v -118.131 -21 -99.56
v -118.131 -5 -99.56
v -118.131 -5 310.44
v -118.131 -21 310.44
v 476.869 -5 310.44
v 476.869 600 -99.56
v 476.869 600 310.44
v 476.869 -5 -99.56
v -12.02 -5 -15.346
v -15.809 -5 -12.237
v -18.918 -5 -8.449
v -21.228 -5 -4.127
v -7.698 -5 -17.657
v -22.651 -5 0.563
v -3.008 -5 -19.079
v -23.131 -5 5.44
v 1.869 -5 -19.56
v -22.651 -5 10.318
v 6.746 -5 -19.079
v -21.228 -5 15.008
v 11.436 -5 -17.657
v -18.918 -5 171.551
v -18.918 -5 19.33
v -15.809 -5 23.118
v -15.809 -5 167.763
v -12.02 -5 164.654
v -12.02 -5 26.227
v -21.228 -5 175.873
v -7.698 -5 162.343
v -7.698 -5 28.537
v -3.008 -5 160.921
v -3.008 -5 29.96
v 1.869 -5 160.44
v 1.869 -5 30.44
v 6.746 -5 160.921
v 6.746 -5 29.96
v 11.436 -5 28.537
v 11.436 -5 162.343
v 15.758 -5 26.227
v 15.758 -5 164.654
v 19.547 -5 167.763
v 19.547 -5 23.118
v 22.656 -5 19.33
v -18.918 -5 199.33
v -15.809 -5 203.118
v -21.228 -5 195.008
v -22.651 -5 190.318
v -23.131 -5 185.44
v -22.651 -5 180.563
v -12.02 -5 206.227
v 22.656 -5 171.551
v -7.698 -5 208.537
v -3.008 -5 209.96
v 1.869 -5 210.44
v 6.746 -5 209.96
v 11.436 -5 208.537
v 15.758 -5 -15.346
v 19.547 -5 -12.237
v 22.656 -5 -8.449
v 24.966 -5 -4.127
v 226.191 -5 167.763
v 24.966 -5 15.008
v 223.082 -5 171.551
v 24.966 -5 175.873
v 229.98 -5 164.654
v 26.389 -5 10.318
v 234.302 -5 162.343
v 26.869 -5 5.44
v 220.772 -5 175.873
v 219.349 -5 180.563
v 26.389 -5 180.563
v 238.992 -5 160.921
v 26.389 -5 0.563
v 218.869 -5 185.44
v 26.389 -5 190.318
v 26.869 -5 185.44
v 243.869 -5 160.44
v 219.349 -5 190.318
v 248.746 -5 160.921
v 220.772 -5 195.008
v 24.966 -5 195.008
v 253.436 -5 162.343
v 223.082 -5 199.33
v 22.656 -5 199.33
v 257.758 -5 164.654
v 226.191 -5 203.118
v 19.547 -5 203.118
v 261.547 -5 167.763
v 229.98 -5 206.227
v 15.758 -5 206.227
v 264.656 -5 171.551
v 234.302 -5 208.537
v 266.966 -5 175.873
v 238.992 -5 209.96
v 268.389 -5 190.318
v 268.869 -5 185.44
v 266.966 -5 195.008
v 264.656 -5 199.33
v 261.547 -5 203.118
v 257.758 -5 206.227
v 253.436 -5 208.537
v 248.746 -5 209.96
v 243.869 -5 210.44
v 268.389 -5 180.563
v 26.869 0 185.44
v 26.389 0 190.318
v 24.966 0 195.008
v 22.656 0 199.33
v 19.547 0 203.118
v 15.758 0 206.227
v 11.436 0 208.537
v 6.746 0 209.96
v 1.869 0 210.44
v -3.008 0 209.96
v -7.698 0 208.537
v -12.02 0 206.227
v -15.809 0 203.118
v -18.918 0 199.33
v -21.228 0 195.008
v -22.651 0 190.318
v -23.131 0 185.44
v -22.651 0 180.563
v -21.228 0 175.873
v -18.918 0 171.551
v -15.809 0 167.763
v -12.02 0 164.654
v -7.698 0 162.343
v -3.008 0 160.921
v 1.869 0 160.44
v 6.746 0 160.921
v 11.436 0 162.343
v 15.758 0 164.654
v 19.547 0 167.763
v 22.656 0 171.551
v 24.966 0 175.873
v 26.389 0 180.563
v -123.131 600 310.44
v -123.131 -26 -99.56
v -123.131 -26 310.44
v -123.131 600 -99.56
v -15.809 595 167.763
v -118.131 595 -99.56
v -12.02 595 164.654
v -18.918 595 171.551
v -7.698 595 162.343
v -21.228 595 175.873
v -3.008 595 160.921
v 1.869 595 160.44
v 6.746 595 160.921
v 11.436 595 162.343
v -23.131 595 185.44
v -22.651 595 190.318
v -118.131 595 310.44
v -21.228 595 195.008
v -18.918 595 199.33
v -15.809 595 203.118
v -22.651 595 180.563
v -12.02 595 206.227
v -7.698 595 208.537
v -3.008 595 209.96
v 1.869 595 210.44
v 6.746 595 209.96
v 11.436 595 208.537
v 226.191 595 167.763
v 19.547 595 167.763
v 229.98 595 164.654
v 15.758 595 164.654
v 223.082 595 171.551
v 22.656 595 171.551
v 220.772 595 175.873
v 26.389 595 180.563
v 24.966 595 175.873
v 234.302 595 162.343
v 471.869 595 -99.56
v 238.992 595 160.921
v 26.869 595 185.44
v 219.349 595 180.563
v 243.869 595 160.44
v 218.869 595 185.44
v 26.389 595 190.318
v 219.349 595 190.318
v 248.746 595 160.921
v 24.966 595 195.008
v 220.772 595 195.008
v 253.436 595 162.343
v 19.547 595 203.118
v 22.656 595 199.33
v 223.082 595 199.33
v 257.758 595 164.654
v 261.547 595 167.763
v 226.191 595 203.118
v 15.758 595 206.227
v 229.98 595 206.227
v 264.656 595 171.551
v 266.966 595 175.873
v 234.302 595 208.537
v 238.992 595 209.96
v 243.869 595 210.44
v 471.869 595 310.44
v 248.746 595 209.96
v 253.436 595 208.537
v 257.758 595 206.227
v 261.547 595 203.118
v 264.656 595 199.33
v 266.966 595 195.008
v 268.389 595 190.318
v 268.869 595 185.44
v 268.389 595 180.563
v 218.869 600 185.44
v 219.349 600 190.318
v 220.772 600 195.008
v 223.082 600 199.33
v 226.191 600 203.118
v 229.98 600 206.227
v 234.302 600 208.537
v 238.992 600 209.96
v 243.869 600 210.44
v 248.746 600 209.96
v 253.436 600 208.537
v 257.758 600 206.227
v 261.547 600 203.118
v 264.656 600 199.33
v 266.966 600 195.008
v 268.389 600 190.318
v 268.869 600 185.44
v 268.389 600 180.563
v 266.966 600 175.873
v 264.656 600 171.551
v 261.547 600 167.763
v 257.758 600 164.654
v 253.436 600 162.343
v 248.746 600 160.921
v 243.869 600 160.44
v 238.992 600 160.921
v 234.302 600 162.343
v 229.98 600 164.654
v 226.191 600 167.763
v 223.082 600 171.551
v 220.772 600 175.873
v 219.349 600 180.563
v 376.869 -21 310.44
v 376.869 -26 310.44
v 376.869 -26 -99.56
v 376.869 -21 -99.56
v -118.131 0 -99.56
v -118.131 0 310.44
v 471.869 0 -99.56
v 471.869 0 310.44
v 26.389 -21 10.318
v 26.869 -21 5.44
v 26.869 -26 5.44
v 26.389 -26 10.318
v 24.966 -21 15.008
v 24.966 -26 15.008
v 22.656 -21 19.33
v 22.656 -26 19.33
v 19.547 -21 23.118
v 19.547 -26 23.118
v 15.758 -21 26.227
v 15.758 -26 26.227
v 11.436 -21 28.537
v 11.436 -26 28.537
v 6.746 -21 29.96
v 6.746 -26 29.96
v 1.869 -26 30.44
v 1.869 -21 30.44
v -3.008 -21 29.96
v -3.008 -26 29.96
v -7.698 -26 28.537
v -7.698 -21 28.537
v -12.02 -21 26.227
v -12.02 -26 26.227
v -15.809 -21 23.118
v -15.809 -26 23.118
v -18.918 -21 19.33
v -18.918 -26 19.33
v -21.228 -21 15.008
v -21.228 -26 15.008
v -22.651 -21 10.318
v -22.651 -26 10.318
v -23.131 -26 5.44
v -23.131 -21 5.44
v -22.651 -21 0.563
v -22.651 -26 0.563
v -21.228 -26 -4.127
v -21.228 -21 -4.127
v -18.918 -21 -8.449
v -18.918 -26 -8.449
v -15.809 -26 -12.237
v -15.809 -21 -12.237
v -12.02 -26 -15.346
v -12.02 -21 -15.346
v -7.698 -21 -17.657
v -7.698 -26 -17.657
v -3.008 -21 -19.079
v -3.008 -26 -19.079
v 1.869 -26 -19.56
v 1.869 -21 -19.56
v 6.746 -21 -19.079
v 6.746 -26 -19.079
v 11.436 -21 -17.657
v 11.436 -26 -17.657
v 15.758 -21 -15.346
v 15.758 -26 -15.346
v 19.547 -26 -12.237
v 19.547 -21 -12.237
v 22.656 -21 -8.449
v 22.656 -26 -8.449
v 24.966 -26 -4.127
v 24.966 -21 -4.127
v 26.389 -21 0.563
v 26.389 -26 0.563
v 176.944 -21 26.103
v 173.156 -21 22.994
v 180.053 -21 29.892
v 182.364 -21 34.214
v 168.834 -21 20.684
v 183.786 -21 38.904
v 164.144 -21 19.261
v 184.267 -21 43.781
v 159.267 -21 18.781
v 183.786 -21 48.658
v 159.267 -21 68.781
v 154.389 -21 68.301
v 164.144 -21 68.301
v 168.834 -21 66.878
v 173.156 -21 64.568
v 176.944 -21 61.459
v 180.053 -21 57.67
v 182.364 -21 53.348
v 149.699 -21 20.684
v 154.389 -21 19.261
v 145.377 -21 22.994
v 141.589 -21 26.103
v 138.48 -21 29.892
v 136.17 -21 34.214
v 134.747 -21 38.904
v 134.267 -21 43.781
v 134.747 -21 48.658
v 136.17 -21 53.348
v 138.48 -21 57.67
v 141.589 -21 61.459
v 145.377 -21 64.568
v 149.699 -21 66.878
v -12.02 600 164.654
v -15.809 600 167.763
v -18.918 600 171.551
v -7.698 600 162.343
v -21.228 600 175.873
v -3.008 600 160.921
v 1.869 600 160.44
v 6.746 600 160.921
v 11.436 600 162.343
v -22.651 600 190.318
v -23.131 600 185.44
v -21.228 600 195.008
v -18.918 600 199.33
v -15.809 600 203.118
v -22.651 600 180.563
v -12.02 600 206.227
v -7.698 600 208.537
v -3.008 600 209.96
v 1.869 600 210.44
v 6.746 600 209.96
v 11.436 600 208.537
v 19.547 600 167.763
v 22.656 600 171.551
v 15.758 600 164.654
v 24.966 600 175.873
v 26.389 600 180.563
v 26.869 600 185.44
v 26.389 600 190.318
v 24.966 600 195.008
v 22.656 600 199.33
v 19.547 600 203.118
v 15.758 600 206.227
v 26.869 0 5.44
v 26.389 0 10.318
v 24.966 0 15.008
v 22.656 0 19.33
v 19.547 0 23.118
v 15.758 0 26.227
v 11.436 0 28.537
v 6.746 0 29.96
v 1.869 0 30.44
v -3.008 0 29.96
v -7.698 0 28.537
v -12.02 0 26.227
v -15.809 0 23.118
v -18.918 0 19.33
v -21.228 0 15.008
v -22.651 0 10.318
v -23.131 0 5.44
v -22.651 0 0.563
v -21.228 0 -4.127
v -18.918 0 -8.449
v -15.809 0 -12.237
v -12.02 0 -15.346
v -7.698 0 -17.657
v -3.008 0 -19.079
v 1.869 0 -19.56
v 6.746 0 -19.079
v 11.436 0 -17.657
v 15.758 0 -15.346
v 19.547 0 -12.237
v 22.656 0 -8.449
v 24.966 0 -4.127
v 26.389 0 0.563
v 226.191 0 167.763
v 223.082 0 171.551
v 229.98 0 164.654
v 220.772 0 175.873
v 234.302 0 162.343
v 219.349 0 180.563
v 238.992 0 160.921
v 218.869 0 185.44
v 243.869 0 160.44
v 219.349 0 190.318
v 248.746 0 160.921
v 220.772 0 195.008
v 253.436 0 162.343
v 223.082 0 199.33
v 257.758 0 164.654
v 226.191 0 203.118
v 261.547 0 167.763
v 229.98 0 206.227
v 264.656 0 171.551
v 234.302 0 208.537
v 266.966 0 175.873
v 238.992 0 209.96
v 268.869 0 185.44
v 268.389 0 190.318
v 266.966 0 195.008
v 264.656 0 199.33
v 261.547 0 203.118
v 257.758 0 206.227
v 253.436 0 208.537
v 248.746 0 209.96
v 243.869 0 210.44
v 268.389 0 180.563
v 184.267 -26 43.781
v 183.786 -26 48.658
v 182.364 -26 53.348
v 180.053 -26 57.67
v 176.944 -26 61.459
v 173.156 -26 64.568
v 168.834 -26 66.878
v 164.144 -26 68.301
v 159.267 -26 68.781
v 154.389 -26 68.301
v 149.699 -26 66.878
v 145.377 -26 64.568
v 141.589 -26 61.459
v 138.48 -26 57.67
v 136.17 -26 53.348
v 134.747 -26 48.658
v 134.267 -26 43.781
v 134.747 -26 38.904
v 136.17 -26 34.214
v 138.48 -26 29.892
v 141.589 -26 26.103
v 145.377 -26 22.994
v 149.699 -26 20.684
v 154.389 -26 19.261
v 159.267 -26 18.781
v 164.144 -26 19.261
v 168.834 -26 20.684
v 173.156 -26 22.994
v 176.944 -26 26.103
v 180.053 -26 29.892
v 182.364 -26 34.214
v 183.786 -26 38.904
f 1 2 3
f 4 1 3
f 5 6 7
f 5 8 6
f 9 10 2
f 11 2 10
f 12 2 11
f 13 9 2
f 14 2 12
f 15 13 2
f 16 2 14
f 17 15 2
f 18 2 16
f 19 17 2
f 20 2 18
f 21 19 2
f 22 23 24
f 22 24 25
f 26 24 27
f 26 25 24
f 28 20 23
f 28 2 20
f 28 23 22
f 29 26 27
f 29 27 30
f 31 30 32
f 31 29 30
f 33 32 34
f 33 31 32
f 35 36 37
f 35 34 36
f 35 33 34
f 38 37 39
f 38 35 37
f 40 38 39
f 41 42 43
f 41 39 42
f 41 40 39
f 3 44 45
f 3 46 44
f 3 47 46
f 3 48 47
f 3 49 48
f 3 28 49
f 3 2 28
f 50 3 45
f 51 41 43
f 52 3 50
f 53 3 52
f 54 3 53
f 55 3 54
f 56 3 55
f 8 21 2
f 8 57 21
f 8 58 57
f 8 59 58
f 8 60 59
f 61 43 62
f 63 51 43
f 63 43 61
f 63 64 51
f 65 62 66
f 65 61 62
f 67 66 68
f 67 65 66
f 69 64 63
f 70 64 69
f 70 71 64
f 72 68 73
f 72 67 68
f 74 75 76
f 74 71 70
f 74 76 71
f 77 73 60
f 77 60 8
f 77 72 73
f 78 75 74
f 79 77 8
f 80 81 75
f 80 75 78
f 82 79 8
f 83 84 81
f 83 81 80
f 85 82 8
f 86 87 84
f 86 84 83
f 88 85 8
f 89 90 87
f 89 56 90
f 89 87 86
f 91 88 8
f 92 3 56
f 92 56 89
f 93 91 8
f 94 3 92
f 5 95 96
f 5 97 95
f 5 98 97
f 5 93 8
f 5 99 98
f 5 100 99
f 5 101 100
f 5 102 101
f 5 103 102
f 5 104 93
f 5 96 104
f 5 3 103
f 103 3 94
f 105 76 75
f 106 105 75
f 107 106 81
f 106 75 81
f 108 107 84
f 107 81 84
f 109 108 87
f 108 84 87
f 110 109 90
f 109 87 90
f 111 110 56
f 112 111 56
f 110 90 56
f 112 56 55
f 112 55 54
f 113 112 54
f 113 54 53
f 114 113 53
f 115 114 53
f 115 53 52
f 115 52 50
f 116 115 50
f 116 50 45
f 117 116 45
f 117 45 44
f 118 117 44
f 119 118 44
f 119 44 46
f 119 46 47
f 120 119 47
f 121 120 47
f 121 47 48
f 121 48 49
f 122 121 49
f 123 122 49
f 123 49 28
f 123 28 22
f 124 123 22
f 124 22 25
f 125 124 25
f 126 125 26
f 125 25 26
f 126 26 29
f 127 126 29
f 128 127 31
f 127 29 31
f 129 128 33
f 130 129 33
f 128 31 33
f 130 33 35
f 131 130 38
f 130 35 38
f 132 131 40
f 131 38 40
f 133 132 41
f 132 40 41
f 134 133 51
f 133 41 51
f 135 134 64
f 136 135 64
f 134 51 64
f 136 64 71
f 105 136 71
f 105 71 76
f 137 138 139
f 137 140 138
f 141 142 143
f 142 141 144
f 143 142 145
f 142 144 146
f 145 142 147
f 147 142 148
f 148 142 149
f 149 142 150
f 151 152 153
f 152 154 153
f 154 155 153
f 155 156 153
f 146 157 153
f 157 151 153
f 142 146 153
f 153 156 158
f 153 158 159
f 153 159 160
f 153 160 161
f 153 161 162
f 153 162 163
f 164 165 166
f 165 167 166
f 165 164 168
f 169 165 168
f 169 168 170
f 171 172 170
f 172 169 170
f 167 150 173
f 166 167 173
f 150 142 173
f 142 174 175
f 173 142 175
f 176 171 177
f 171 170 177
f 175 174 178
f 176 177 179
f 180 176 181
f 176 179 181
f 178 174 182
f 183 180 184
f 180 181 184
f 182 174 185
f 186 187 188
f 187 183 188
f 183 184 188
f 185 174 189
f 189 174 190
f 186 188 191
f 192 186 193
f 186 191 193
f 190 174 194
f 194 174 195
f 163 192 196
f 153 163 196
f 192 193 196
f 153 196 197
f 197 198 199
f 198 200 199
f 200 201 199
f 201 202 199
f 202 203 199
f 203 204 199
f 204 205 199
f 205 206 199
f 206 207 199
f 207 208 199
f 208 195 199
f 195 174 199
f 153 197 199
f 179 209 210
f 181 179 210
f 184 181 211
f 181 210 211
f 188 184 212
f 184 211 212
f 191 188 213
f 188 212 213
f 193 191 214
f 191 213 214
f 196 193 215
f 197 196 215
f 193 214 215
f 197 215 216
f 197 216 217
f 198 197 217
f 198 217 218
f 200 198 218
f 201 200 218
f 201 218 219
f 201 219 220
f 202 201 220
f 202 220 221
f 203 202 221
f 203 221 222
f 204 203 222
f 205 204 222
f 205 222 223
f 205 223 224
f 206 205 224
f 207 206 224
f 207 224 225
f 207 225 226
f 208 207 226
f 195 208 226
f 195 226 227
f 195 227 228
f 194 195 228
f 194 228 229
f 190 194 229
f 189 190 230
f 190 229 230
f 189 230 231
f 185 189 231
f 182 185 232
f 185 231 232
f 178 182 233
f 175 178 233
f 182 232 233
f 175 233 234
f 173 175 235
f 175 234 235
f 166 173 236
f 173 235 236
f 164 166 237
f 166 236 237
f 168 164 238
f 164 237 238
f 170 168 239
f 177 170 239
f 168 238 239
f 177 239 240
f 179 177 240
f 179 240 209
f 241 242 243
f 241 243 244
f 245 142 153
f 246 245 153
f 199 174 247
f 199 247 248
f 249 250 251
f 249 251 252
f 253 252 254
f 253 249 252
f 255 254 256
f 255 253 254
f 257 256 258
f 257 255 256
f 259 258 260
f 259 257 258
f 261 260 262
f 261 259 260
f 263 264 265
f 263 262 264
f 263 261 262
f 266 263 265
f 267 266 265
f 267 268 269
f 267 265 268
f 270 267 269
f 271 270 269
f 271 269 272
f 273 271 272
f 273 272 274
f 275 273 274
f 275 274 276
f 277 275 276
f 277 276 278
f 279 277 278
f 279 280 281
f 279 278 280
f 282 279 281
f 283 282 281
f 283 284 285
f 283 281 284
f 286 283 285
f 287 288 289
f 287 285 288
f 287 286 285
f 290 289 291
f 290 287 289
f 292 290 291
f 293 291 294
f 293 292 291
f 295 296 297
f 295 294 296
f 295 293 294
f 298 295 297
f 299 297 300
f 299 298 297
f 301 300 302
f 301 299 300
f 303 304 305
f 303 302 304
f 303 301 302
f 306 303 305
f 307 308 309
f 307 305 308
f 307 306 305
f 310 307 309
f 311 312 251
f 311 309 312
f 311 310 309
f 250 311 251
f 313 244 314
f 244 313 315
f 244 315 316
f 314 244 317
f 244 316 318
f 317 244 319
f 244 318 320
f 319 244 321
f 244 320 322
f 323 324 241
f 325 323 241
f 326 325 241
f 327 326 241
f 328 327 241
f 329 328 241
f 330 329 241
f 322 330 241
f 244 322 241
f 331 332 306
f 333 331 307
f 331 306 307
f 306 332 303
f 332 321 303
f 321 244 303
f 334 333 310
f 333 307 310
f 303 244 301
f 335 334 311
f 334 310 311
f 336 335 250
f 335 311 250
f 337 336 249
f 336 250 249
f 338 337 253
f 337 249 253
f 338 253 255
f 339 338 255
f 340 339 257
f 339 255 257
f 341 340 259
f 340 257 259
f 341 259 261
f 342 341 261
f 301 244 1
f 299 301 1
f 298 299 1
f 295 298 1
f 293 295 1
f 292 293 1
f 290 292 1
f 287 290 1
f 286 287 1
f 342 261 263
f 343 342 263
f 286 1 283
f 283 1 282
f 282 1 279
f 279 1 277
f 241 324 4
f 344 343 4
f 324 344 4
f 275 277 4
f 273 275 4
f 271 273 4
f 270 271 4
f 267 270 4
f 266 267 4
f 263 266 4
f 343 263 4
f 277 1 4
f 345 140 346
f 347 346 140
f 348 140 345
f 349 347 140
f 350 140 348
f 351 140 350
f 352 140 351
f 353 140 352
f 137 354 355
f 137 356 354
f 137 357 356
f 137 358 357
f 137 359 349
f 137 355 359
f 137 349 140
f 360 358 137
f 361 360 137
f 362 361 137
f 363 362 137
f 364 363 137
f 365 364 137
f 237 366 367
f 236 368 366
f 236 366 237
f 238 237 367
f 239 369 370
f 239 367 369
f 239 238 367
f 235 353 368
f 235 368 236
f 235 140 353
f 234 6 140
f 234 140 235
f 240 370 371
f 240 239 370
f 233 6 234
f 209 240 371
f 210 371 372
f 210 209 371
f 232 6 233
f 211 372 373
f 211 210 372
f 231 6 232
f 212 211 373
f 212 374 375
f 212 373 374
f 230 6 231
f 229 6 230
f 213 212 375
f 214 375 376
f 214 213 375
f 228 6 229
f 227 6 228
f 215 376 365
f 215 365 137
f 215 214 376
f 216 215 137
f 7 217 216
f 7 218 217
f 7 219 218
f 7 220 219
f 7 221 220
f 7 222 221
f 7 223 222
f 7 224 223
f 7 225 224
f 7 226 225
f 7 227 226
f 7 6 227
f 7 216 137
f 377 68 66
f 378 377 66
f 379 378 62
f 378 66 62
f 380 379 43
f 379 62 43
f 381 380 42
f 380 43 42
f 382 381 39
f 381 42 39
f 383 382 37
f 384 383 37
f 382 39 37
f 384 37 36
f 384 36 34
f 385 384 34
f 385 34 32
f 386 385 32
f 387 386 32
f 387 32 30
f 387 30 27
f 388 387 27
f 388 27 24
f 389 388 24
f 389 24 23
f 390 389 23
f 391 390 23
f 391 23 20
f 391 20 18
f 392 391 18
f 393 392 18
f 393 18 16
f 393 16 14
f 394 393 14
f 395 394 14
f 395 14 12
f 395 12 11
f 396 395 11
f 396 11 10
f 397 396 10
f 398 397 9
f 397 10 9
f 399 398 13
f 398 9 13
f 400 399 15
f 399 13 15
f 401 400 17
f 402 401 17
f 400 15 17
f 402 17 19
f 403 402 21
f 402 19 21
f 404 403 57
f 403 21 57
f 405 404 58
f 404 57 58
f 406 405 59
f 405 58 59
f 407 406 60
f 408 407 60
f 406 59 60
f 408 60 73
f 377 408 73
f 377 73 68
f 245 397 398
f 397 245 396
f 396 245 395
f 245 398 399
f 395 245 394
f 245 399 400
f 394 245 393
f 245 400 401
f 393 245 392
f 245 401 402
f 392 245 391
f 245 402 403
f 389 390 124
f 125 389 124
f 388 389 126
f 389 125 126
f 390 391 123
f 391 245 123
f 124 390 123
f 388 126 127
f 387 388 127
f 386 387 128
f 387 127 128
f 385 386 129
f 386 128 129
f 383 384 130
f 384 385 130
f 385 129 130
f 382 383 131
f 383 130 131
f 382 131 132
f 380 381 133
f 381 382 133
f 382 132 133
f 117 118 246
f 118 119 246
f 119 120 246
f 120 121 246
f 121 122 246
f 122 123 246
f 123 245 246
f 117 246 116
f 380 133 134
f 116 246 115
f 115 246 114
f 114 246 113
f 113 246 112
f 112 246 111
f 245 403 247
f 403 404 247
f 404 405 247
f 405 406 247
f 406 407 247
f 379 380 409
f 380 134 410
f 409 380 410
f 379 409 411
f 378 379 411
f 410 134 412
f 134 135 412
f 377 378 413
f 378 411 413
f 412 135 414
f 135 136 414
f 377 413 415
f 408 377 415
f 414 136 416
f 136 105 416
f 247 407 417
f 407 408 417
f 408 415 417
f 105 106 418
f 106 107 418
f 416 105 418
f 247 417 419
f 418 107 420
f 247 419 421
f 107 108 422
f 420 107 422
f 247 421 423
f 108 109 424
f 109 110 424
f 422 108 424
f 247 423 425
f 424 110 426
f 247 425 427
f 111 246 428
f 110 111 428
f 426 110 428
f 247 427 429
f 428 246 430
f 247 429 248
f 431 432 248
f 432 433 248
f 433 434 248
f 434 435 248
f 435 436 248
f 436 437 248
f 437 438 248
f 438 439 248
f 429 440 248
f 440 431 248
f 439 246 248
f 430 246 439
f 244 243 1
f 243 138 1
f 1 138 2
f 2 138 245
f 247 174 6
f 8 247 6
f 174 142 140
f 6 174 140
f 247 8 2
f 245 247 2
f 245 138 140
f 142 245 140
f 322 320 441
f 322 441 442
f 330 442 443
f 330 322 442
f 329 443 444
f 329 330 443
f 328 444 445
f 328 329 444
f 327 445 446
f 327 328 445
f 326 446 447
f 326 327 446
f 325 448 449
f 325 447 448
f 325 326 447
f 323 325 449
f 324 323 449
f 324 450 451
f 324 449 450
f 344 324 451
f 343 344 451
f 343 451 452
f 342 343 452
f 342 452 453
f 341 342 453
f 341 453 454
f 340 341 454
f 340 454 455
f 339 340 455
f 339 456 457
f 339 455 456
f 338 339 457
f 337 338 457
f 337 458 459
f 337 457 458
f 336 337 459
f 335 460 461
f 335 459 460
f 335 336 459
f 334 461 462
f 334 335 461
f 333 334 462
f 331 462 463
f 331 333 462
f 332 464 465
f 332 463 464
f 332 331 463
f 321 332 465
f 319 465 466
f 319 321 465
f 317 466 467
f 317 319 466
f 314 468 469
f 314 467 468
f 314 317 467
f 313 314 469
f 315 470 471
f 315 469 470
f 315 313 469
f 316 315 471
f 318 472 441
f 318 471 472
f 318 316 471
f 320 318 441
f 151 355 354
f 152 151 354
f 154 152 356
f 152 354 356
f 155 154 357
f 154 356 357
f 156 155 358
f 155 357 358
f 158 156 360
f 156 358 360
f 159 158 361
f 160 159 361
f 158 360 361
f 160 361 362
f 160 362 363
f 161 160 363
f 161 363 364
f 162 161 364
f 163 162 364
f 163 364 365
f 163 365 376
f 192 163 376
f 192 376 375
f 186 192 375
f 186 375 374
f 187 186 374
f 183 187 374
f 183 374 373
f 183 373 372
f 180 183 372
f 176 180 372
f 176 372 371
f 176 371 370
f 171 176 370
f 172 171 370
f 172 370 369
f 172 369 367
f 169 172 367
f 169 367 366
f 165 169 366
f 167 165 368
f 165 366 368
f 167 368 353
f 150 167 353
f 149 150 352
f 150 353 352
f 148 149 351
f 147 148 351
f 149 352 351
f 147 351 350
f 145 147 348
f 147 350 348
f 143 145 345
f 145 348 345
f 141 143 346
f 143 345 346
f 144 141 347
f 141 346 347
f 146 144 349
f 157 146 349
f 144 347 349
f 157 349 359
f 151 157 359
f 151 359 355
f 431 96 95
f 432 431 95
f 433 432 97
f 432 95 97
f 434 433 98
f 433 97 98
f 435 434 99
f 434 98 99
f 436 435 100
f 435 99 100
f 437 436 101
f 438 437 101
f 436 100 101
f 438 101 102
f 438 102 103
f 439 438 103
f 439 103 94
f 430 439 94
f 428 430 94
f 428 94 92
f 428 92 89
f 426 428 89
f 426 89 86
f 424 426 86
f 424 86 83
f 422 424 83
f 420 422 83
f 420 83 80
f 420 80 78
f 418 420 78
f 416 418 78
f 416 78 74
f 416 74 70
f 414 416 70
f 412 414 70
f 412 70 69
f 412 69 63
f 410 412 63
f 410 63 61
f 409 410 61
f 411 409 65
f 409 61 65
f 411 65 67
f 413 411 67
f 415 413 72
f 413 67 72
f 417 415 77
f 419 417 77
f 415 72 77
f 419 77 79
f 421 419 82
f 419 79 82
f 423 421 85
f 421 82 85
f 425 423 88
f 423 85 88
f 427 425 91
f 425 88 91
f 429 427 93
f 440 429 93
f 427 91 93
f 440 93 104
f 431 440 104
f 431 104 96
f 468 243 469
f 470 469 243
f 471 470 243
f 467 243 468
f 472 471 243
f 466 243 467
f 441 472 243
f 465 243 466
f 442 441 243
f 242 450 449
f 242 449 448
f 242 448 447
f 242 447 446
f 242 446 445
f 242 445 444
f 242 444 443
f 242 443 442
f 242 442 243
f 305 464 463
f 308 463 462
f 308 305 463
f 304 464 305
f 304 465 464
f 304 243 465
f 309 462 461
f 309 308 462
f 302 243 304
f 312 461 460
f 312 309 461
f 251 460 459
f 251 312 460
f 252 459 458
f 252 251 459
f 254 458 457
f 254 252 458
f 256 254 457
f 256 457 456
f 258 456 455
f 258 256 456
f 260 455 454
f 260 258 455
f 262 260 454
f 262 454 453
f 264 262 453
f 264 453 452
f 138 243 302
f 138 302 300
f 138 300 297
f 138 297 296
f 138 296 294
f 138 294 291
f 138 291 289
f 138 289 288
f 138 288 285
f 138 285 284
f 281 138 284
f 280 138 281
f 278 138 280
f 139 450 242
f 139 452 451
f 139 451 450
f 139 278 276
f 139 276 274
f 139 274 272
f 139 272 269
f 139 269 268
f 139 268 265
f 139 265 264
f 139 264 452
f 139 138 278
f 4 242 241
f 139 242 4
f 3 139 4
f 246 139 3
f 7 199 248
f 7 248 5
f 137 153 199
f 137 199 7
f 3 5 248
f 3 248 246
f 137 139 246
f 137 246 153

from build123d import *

# Parameters (mm, degrees)
F0_W      = 600
F0_H      = 410
F1_DEPTH  = 5
F3_W      = 5
F3_H      = 410
F4_DEPTH  = 600
F5_W      = 5
F5_H      = 410
F6_DEPTH  = 591
F7_R      = 25
F8_DEPTH  = 25.4
F2_R      = 25
F9_DEPTH  = 25.4
F10_DEPTH = 25.4
F11_DEPTH = 25.4
F2_W      = 5
F2_H      = 410
F12_DEPTH = 21
F13_W     = 5
F13_H     = 410
F14_DEPTH = 495
F15_DEPTH = 76.2
F16_DEPTH = 25.4


with BuildPart() as f1:
    # F0 (on Front) → F1 (new body)
    with BuildSketch(Plane.XZ):
        with Locations((176.868889, 105.440454)):
            Rectangle(F0_W, F0_H)
    extrude(amount=F1_DEPTH)

    # F3 (on face) → F4 (join)
    with BuildSketch(Plane(origin=(0, 0, 0), x_dir=(-1, 0, 0), z_dir=(0, 1, 0))):
        with Locations((-474.368889, 105.440454)):
            Rectangle(F3_W, F3_H)
        with Locations((120.631111, 105.440454)):
            Rectangle(F3_W, F3_H)
    extrude(amount=F4_DEPTH)

    # F5 (on face) → F6 (join)
    with BuildSketch(Plane(origin=(471.868889, 0, 0), x_dir=(0, -1, 0), z_dir=(-1, 0, 0))):
        with Locations((-597.5, 105.440454)):
            Rectangle(F5_W, F5_H)
    extrude(amount=F6_DEPTH)

    # F7 (on face) → F8 (cut)
    with BuildSketch(Plane(origin=(0, 600, 0), x_dir=(-1, 0, 0), z_dir=(0, 1, 0))):
        with Locations((-1.868889, 185.440454)):
            Circle(F7_R)
        with Locations((-243.868889, 185.440454)):
            Circle(F7_R)
    extrude(amount=-F8_DEPTH, mode=Mode.SUBTRACT)

    # F2 (on face) → F9 (cut)
    with BuildSketch(Plane.XZ.offset(5)):
        with Locations((1.868889, 185.440454)):
            Circle(F2_R)
    extrude(amount=-F9_DEPTH, mode=Mode.SUBTRACT)

    # F2 (on face) → F10 (cut)
    with BuildSketch(Plane.XZ.offset(5)):
        with Locations((243.868889, 185.440454)):
            Circle(F2_R)
    extrude(amount=-F10_DEPTH, mode=Mode.SUBTRACT)

    # F2 (on face) → F11 (cut)
    with BuildSketch(Plane.XZ.offset(5)):
        with Locations((1.868889, 5.440454)):
            Circle(F2_R)
    extrude(amount=-F11_DEPTH, mode=Mode.SUBTRACT)

    # F2 (on face) → F12 (join)
    with BuildSketch(Plane.XZ.offset(5)):
        with Locations((-120.631111, 105.440454)):
            Rectangle(F2_W, F2_H)
    extrude(amount=F12_DEPTH)

    # F13 (on face) → F14 (join)
    with BuildSketch(Plane.YZ.offset(-118.131111)):
        with Locations((-23.5, 105.440454)):
            Rectangle(F13_W, F13_H)
    extrude(amount=F14_DEPTH)

    # F2 (on face) → F15 (cut)
    with BuildSketch(Plane.XZ.offset(5)):
        with Locations((1.868889, 5.440454)):
            Circle(F2_R)
    extrude(amount=F15_DEPTH, mode=Mode.SUBTRACT)

    # F2 (on face) → F16 (cut)
    with BuildSketch(Plane.XZ.offset(5)):
        with Locations((159.266515, 43.780868)):
            Circle(F2_R)
    extrude(amount=F16_DEPTH, mode=Mode.SUBTRACT)


solid = f1.part
